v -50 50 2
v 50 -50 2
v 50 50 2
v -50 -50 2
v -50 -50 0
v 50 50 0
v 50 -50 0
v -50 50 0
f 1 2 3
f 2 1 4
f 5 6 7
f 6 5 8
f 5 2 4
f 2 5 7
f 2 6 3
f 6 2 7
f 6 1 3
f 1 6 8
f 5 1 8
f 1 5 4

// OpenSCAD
// The purpose of this model is to test the thickness of walls, the outer dimensions of various
// shapes, and the internal dimensions of holes created inside shapes

//======================================================================================
test_platform_base_width        = 100;
test_platform_base_length       = 100;
test_platform_base_height       = 2;

test_feature_height             = [1,2,4,8,16,32];
test_feature_width              = [1,2,4,8,16,32];

//======================================================================================


// Generate the platform base
translate([-(test_platform_base_width/2),-(test_platform_base_length/2),0])
{
    cube([test_platform_base_width,test_platform_base_length,test_platform_base_height]);
}

// Generate a set of bars

// Generate a sex of X's

// Generate a set of Full Boxes

// Generate a set of Hollow Boxes

// Generate a set of Cylinders

// Generate a set of Hollow Cylinders

// Generate a set of Half Spheres

// Generate a set of Half Hollow Spheres

// Generate a set of Cubes, with holes along the X axis

// Generate a set of Cubes, with holes along the Y axis

// Generate a set of Cubes, with holes along the Z axis

//======================================================================================
module test_bar(x,y,z,x_off,y_off,z_off)
{
    translate([x_off,y_off,z_off])
    {
        cube([x,y,z],center=true);
    }
}
module test_box(x,y,z,x_off,y_off,z_off)
{
    
}
module test_box_hollow(x,y,z,x_off,y_off,z_off)
{
    
}
module test_cylinder(r,h,x_off,y_off,z_off)
{
    
}
module test_cylinder_hollow(r,h,r_2,x_off,y_off,z_off)
{
    
}
module test_cross(x,y,z,x_off,y_off,z_off)
{
    
}
